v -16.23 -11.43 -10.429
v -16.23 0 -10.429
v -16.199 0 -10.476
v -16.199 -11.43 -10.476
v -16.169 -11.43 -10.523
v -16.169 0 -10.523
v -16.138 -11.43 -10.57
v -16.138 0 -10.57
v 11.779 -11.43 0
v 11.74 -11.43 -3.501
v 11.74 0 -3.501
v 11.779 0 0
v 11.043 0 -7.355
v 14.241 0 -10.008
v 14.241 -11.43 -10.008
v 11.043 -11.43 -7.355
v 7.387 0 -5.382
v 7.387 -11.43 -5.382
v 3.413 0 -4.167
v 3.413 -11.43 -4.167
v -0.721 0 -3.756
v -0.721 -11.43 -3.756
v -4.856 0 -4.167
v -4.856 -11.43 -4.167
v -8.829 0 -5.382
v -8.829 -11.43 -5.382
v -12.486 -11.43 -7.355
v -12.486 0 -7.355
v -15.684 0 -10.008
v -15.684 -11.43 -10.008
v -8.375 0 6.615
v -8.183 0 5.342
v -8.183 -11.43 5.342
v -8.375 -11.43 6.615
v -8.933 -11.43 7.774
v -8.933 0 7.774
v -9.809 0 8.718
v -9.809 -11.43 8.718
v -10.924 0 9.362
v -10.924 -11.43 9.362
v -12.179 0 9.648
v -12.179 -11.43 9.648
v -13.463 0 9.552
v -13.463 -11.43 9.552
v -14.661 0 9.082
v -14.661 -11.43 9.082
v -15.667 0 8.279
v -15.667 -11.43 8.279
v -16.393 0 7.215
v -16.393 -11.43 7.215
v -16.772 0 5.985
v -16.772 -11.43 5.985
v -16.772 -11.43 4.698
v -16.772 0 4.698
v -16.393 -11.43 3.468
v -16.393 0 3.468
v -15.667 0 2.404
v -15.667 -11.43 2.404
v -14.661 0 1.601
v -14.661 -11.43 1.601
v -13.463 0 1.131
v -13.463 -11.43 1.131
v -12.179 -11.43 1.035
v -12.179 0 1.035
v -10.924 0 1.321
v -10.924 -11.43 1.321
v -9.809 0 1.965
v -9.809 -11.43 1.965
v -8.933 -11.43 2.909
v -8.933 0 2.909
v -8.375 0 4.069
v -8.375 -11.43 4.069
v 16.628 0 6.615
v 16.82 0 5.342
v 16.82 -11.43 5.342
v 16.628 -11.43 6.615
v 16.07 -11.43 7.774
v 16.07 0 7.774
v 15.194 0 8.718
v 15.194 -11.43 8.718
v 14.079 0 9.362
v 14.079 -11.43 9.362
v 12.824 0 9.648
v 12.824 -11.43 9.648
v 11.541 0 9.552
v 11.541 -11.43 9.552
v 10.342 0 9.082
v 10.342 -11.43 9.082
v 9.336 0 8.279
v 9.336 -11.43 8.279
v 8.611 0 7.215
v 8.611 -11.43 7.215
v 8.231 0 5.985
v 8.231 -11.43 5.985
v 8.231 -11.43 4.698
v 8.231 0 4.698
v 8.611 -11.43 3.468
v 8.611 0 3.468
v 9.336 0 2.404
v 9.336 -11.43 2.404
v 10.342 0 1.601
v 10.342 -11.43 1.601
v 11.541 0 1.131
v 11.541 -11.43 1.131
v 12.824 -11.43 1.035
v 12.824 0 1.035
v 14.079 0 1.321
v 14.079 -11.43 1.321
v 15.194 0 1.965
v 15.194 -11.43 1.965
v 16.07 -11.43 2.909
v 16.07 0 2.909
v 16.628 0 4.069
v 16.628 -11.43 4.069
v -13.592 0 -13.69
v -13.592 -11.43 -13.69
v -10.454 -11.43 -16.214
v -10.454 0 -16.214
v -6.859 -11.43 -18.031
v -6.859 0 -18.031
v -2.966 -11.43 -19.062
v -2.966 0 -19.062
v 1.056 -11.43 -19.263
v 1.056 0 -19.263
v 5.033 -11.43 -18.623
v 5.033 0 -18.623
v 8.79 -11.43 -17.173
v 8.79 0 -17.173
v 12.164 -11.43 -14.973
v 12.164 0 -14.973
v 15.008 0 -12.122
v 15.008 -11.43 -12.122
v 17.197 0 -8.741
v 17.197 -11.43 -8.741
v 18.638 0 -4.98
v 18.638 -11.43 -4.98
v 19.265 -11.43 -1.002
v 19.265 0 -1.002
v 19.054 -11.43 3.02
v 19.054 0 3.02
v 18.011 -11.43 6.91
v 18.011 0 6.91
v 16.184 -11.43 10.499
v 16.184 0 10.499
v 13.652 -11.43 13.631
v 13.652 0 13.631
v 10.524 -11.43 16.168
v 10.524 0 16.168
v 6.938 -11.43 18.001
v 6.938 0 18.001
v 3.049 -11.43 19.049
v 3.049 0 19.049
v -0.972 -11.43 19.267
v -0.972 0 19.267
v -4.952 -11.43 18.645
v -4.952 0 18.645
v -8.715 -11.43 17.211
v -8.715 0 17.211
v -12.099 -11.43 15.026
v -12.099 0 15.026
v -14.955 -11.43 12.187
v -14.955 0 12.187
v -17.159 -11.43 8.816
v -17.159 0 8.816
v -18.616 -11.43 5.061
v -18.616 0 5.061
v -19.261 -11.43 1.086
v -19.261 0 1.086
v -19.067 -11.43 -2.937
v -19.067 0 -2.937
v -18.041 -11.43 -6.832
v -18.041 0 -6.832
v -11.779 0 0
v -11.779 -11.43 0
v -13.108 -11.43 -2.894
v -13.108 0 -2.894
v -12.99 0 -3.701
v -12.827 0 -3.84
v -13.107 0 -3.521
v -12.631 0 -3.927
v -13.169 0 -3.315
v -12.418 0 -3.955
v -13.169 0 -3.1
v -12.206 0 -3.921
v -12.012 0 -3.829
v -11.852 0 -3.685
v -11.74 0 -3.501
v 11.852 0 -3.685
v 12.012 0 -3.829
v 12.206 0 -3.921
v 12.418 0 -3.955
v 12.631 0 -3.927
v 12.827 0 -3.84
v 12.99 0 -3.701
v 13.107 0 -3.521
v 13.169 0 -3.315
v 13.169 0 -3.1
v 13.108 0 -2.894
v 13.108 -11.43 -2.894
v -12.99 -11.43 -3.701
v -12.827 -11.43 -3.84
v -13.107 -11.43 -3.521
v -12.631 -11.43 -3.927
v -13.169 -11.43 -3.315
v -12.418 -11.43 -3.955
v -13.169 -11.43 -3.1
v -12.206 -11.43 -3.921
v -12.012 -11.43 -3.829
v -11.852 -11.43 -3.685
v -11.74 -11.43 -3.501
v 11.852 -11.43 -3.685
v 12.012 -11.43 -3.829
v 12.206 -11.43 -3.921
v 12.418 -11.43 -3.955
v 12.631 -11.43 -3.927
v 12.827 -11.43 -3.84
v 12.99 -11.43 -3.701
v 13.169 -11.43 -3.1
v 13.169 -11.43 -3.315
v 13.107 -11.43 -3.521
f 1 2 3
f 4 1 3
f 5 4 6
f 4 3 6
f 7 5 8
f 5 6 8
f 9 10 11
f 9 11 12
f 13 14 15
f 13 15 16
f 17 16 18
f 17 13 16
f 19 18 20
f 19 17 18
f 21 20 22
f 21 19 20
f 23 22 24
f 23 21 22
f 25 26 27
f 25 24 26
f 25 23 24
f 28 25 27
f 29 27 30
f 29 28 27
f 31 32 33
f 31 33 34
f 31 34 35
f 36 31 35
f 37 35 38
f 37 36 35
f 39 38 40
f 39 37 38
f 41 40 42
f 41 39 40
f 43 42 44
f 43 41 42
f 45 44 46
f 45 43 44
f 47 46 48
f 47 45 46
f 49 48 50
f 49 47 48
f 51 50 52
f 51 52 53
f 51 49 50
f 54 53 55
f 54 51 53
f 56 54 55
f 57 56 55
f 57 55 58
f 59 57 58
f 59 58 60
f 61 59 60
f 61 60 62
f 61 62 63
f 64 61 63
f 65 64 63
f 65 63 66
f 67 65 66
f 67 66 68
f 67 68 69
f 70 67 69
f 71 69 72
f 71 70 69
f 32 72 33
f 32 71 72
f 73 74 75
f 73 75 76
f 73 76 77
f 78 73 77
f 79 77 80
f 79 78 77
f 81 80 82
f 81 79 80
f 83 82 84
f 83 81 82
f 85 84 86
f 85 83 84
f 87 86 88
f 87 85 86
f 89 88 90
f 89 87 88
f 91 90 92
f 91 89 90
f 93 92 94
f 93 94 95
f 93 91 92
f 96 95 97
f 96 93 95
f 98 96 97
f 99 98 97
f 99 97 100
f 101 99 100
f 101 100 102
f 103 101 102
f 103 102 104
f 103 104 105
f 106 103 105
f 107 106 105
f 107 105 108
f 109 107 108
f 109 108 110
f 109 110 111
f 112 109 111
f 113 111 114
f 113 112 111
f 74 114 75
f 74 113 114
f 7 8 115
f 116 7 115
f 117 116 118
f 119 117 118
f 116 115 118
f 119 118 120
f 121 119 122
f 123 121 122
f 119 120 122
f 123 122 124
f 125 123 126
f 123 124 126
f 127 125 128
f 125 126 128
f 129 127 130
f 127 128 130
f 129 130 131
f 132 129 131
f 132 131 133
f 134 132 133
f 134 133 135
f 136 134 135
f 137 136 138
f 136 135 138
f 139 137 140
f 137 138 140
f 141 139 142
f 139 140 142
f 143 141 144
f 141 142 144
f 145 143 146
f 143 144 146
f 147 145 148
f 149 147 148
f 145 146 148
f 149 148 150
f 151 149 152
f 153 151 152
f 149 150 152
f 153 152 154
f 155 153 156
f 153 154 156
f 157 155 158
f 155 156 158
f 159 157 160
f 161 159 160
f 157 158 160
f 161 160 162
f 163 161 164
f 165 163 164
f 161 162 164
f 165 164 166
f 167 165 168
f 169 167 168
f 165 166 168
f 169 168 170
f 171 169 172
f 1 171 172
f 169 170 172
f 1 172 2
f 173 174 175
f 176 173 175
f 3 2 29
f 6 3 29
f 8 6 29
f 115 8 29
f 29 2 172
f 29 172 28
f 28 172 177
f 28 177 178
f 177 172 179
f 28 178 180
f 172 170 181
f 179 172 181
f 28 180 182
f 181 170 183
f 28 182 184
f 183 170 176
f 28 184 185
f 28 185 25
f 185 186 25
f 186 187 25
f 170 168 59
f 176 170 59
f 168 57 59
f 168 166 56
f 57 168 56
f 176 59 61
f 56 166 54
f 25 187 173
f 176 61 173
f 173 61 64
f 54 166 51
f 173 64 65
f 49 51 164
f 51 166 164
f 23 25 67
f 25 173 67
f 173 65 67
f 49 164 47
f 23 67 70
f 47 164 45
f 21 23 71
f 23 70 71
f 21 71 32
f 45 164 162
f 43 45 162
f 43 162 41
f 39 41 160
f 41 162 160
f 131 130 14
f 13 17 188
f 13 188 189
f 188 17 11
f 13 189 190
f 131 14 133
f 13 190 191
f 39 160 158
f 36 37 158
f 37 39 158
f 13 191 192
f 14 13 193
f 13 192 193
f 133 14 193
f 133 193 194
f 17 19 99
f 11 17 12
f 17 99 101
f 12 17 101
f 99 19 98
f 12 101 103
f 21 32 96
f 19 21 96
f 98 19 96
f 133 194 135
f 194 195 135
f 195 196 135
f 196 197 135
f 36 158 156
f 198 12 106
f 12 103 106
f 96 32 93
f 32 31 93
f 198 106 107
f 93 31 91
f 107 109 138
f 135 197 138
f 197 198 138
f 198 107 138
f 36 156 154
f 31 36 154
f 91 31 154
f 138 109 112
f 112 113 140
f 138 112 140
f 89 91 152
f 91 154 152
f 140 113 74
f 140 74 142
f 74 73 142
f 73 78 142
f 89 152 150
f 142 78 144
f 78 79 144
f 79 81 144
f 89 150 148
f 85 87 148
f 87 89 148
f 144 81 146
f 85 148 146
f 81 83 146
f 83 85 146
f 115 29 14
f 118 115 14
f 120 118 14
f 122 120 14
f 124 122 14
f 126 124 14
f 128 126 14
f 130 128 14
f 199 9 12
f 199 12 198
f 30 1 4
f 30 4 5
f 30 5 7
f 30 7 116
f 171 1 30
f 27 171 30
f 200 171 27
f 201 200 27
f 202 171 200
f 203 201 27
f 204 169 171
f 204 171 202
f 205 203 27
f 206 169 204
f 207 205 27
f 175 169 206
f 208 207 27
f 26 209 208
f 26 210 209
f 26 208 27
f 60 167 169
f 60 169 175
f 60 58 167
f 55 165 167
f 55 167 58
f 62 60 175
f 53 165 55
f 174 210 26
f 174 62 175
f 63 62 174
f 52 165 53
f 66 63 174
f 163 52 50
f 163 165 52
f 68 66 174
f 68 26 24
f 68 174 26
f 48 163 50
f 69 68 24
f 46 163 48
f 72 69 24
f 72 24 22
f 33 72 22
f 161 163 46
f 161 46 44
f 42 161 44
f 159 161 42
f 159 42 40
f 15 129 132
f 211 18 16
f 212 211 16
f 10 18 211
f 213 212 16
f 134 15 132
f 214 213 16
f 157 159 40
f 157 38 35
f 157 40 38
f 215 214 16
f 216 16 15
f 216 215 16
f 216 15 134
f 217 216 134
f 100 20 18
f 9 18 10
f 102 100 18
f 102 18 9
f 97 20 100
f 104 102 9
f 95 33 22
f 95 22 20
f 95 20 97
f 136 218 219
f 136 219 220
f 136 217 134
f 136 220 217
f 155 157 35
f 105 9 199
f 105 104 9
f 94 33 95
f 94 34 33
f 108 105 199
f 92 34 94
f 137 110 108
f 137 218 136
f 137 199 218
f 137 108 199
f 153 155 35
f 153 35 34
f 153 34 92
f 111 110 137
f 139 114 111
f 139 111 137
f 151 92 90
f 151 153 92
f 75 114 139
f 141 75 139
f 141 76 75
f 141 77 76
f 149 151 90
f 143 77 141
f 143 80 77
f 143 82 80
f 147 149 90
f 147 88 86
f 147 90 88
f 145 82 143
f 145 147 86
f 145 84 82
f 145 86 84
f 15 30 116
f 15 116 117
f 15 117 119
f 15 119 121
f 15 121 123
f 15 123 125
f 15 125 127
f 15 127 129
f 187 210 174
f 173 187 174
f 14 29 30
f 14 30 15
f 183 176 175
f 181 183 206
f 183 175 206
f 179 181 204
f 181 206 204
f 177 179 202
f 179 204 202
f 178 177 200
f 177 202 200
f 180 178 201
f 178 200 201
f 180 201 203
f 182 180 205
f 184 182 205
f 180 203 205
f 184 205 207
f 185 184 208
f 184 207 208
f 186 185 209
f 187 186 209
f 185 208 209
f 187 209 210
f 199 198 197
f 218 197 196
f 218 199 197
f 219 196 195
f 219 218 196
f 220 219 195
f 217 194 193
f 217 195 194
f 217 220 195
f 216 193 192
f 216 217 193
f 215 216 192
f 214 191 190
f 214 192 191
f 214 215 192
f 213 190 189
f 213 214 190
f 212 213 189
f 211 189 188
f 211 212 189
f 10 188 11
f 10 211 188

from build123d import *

# Parameters (mm, degrees)
F0_R     = 4.3187243864
F1_DEPTH = 11.43
F4_DEPTH = 25.4
F6_DEPTH = 25.4


# Not quite as in the source:
# - a pattern or mirror of a feature is missing from the dataset's text; its kind, count and spacing are read off the source's solid
# - the program builds the solid bodies; features that only make, move or delete a surface that nothing else refers to are left out


with BuildPart() as f1:
    # F0 (on Front) → F1 (new body)
    with BuildSketch(Plane.XZ):
        with BuildLine():
            ThreePointArc((-16.2297749531, -10.4286198462), (-16.1842309709, -10.4991606713), (-16.1383803934, -10.5695025995))
            ThreePointArc((-16.1383803934, -10.5695025995), (5.5149003864, -18.4864161116), (19.2914931232, 0))
            ThreePointArc((19.2914931232, 0), (-5.4343865811, 18.5102444449), (-16.2297749531, -10.4286198462))
        make_face()
        with Locations((-12.5015638769, 5.341576878)):
            Circle(F0_R, mode=Mode.SUBTRACT)
        with Locations((12.5015638769, 5.341576878)):
            Circle(F0_R, mode=Mode.SUBTRACT)
    extrude(amount=F1_DEPTH)

    # F2 (on Front) → F4 (cut)
    with BuildSketch(Plane.XZ):
        with BuildLine():
            Line((-15.6837776303, -10.0077530369), (14.2410276458, -10.0077530369))
            ThreePointArc((14.2410276458, -10.0077530369), (-0.7213749923, -3.7564431571), (-15.6837776303, -10.0077530369))
        make_face()
    extrude(amount=F4_DEPTH, mode=Mode.SUBTRACT)

    # F5 (on face) → F6 (cut)
    with BuildSketch(Plane.XZ.offset(11.43)):
        with BuildLine():
            Line((-11.7404377088, -3.5014220048), (-11.7787355557, 0))
            Line((-11.7787355557, 0), (-13.1083335727, -2.8944755904))
            ThreePointArc((-13.1083335727, -2.8944755904), (-12.7318294924, -3.8908455066), (-11.7404377088, -3.5014220048))
        make_face()
    f6 = extrude(amount=-F6_DEPTH, mode=Mode.SUBTRACT)

    # F6_copies: F6 across plane
    add(f6.mirror(Plane(origin=(0, 0, 0), x_dir=(0, 0, 1), z_dir=(1, 0, 0))), mode=Mode.SUBTRACT)


solid = f1.part
